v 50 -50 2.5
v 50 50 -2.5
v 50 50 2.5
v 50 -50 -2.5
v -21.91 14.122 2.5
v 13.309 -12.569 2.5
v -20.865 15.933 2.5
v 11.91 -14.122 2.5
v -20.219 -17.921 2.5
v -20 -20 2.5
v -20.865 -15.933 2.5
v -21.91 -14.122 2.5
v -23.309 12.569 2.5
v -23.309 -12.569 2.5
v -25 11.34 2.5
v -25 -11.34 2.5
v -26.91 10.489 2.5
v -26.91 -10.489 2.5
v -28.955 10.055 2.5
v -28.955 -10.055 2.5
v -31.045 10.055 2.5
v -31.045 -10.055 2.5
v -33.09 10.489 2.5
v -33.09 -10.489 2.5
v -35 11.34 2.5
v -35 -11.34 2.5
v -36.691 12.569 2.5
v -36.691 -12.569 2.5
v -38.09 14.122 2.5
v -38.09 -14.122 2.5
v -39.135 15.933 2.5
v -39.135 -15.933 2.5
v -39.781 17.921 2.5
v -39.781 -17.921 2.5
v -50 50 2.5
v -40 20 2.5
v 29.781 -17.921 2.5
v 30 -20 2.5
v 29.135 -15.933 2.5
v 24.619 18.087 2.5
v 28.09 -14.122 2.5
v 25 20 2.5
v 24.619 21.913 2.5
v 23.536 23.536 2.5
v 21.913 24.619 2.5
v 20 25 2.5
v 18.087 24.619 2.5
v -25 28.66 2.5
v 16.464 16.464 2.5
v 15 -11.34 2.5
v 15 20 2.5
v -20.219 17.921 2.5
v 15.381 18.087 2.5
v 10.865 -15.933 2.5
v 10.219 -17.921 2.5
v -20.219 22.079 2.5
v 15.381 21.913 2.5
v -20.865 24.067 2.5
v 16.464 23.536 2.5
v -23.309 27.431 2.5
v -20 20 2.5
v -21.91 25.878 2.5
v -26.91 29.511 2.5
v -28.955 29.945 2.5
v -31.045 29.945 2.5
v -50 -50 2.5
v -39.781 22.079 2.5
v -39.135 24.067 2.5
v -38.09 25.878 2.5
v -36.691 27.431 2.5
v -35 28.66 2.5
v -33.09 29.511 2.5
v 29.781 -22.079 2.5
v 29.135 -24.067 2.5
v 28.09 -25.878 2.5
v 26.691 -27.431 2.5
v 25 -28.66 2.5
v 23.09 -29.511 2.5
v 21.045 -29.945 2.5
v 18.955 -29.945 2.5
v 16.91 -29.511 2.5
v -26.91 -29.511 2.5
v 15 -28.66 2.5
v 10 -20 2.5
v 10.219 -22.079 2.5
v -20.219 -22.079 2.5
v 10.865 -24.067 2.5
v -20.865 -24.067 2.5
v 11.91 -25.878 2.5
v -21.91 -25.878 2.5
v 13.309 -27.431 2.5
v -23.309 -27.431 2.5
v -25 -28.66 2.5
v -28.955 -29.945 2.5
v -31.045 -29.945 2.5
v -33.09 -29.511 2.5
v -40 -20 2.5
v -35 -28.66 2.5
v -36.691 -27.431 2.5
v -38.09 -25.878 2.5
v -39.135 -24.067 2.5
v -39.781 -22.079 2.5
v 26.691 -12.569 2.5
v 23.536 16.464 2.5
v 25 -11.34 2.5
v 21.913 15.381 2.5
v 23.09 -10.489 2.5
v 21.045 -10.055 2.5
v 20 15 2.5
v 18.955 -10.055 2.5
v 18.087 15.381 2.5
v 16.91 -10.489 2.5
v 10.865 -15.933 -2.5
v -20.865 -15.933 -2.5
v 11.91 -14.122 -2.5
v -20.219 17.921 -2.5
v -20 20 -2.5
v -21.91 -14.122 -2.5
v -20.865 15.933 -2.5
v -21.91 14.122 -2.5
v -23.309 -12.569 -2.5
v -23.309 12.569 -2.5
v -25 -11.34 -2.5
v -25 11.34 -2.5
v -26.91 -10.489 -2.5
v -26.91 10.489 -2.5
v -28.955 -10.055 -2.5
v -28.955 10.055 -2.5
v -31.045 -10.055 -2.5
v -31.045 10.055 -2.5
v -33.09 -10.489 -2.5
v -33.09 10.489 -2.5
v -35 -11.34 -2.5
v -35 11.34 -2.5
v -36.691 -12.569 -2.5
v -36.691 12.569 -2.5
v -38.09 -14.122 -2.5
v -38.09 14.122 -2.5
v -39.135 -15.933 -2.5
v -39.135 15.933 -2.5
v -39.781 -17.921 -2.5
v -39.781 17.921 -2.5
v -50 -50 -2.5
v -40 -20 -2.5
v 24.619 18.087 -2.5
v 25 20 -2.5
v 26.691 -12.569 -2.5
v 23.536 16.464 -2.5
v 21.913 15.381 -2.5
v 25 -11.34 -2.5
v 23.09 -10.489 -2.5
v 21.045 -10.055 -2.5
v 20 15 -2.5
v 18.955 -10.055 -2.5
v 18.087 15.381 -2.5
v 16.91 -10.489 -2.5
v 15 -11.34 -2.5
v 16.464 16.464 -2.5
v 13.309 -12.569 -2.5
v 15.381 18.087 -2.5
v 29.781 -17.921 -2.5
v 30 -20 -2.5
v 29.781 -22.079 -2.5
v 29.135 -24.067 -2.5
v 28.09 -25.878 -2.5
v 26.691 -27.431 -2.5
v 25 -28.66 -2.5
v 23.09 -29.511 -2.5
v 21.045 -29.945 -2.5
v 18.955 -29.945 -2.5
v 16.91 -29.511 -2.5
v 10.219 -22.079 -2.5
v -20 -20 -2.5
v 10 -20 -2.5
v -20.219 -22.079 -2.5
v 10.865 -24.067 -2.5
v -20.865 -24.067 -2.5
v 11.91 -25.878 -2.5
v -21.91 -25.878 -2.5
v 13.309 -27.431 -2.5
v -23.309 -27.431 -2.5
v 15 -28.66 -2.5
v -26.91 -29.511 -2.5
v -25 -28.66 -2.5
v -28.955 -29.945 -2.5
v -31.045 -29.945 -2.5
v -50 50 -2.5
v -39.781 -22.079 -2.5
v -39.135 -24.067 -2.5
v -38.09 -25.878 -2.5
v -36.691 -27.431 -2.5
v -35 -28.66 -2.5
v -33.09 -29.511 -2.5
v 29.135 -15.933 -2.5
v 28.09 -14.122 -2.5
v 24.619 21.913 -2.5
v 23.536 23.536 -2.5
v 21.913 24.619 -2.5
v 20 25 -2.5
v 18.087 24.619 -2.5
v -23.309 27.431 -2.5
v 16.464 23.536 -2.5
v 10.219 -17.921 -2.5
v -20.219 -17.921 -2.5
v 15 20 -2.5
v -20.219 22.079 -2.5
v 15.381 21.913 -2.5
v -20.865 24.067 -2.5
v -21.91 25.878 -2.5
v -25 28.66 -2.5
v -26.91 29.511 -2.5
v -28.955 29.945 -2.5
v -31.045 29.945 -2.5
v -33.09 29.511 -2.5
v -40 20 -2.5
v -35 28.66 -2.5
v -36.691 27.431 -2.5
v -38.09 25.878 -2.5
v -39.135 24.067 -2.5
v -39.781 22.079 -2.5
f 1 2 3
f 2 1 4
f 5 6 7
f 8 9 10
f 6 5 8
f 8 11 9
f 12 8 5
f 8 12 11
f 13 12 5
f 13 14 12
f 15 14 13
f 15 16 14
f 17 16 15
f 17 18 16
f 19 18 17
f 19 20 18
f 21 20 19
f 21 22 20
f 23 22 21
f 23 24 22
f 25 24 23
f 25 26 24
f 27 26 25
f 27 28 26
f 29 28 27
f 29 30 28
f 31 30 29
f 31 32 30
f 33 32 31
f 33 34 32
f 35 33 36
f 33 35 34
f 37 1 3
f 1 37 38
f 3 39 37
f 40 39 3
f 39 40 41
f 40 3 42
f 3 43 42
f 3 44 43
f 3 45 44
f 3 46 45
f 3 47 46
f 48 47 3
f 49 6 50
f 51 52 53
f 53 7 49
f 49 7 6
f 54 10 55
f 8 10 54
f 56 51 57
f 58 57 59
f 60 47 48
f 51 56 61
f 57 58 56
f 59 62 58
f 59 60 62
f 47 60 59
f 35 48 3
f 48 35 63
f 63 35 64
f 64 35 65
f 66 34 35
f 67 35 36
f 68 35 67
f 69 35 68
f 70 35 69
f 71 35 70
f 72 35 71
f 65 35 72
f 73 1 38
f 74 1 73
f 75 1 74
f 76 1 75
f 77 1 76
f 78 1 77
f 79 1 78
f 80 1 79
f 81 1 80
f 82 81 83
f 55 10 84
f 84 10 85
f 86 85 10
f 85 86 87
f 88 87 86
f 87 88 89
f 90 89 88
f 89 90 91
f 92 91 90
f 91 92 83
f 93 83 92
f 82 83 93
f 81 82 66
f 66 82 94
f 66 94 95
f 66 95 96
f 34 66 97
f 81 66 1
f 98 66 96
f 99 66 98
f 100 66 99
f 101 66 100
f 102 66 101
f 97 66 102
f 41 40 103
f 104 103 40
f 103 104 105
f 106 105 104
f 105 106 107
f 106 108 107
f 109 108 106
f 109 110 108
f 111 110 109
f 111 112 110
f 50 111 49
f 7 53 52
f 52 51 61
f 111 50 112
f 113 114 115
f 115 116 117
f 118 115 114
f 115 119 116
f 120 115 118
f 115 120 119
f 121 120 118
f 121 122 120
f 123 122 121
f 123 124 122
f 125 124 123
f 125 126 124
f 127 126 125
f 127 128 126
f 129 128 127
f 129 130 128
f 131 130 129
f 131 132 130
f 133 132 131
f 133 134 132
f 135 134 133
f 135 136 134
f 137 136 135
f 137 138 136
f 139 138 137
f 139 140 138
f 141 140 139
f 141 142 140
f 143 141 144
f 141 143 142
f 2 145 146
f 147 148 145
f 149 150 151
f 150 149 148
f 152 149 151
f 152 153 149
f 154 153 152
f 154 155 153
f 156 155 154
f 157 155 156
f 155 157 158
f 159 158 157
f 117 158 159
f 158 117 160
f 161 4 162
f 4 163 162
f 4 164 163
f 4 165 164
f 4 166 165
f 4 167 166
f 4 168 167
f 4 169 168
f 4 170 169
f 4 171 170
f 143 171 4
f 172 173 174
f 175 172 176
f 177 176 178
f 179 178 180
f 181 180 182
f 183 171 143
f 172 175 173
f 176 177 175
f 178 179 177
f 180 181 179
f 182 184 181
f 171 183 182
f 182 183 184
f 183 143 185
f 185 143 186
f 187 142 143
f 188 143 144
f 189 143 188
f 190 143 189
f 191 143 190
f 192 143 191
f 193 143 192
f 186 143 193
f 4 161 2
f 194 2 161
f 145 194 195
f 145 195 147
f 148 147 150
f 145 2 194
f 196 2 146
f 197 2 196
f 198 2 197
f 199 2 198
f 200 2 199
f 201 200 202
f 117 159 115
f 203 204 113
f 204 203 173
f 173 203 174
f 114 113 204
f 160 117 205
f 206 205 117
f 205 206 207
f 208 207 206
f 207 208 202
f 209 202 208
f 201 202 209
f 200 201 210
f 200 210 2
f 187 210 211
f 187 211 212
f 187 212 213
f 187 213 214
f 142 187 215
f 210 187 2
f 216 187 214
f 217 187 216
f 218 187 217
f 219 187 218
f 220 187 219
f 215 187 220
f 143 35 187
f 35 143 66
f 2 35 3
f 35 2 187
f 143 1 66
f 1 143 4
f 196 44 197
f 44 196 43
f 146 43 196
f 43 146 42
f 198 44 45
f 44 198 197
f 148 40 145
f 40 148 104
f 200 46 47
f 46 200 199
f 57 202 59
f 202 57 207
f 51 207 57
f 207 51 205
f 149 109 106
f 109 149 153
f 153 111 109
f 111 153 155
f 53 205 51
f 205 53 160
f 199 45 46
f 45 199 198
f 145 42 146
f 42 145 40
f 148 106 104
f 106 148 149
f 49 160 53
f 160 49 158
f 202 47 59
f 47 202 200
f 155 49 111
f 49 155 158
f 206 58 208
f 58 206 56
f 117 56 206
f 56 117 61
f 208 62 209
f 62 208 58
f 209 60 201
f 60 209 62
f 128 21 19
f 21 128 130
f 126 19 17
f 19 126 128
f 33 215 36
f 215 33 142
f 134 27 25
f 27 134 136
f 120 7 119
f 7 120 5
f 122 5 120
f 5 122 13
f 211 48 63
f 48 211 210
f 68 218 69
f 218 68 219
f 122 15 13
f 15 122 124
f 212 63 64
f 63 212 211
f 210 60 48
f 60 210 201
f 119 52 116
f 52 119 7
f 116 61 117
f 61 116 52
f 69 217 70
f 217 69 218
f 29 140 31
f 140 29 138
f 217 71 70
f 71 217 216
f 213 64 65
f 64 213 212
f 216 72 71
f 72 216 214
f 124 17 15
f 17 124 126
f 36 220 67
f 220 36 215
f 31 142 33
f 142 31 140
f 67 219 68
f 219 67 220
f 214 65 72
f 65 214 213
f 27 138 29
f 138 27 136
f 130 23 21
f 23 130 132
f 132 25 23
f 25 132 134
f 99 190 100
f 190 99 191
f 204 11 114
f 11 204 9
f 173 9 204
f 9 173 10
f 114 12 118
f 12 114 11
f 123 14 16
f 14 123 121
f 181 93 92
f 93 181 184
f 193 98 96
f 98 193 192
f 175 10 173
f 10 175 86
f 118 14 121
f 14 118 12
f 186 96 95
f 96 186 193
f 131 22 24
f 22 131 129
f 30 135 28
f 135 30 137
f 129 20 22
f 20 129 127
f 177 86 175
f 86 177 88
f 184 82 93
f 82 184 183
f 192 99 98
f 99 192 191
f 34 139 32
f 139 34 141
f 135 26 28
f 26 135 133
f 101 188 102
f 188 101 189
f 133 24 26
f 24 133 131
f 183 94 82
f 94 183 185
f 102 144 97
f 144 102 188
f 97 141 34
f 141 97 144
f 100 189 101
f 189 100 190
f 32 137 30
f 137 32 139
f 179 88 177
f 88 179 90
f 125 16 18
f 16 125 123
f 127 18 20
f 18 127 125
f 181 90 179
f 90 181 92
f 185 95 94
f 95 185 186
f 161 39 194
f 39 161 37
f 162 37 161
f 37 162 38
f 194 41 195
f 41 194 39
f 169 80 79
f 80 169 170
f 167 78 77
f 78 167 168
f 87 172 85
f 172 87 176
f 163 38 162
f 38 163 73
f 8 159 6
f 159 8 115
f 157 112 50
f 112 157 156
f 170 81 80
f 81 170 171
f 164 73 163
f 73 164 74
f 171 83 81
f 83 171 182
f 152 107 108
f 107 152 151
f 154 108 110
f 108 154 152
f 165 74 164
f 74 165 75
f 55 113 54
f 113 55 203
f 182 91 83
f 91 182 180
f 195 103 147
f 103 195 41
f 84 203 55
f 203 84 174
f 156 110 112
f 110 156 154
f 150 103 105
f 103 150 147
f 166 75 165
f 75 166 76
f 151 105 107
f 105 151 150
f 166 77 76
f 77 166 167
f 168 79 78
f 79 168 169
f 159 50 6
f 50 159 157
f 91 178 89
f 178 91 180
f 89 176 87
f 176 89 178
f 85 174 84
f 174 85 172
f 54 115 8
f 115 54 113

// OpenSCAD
module Hole_Plate(){

// Plate
Plate_Thickness = 5;
Plate_Width = 100;
Plate_Height = 100;

interasse = 50;
interasse_2 = 80;
first_hole = [20,20,-2];
Hole_Diameter = 5;


translate([first_hole[0] - interasse,-20,-2]){
%cube([40,1,1]);
}

difference(){

color("#a8b0b2"){
cube([100,100,Plate_Thickness], center = true);
}


translate(first_hole){
cylinder(12,Hole_Diameter,Hole_Diameter, center = true);
}

translate([first_hole[0] - interasse,20,-2]){
cylinder(12,10,10, center = true);
}

translate([first_hole[0] - interasse,-20,-2]){
cylinder(12,10,10, center = true);
}

translate([20,-20,-2]){
cylinder(12,10,10, center = true);
}


}

}

Hole_Plate();
